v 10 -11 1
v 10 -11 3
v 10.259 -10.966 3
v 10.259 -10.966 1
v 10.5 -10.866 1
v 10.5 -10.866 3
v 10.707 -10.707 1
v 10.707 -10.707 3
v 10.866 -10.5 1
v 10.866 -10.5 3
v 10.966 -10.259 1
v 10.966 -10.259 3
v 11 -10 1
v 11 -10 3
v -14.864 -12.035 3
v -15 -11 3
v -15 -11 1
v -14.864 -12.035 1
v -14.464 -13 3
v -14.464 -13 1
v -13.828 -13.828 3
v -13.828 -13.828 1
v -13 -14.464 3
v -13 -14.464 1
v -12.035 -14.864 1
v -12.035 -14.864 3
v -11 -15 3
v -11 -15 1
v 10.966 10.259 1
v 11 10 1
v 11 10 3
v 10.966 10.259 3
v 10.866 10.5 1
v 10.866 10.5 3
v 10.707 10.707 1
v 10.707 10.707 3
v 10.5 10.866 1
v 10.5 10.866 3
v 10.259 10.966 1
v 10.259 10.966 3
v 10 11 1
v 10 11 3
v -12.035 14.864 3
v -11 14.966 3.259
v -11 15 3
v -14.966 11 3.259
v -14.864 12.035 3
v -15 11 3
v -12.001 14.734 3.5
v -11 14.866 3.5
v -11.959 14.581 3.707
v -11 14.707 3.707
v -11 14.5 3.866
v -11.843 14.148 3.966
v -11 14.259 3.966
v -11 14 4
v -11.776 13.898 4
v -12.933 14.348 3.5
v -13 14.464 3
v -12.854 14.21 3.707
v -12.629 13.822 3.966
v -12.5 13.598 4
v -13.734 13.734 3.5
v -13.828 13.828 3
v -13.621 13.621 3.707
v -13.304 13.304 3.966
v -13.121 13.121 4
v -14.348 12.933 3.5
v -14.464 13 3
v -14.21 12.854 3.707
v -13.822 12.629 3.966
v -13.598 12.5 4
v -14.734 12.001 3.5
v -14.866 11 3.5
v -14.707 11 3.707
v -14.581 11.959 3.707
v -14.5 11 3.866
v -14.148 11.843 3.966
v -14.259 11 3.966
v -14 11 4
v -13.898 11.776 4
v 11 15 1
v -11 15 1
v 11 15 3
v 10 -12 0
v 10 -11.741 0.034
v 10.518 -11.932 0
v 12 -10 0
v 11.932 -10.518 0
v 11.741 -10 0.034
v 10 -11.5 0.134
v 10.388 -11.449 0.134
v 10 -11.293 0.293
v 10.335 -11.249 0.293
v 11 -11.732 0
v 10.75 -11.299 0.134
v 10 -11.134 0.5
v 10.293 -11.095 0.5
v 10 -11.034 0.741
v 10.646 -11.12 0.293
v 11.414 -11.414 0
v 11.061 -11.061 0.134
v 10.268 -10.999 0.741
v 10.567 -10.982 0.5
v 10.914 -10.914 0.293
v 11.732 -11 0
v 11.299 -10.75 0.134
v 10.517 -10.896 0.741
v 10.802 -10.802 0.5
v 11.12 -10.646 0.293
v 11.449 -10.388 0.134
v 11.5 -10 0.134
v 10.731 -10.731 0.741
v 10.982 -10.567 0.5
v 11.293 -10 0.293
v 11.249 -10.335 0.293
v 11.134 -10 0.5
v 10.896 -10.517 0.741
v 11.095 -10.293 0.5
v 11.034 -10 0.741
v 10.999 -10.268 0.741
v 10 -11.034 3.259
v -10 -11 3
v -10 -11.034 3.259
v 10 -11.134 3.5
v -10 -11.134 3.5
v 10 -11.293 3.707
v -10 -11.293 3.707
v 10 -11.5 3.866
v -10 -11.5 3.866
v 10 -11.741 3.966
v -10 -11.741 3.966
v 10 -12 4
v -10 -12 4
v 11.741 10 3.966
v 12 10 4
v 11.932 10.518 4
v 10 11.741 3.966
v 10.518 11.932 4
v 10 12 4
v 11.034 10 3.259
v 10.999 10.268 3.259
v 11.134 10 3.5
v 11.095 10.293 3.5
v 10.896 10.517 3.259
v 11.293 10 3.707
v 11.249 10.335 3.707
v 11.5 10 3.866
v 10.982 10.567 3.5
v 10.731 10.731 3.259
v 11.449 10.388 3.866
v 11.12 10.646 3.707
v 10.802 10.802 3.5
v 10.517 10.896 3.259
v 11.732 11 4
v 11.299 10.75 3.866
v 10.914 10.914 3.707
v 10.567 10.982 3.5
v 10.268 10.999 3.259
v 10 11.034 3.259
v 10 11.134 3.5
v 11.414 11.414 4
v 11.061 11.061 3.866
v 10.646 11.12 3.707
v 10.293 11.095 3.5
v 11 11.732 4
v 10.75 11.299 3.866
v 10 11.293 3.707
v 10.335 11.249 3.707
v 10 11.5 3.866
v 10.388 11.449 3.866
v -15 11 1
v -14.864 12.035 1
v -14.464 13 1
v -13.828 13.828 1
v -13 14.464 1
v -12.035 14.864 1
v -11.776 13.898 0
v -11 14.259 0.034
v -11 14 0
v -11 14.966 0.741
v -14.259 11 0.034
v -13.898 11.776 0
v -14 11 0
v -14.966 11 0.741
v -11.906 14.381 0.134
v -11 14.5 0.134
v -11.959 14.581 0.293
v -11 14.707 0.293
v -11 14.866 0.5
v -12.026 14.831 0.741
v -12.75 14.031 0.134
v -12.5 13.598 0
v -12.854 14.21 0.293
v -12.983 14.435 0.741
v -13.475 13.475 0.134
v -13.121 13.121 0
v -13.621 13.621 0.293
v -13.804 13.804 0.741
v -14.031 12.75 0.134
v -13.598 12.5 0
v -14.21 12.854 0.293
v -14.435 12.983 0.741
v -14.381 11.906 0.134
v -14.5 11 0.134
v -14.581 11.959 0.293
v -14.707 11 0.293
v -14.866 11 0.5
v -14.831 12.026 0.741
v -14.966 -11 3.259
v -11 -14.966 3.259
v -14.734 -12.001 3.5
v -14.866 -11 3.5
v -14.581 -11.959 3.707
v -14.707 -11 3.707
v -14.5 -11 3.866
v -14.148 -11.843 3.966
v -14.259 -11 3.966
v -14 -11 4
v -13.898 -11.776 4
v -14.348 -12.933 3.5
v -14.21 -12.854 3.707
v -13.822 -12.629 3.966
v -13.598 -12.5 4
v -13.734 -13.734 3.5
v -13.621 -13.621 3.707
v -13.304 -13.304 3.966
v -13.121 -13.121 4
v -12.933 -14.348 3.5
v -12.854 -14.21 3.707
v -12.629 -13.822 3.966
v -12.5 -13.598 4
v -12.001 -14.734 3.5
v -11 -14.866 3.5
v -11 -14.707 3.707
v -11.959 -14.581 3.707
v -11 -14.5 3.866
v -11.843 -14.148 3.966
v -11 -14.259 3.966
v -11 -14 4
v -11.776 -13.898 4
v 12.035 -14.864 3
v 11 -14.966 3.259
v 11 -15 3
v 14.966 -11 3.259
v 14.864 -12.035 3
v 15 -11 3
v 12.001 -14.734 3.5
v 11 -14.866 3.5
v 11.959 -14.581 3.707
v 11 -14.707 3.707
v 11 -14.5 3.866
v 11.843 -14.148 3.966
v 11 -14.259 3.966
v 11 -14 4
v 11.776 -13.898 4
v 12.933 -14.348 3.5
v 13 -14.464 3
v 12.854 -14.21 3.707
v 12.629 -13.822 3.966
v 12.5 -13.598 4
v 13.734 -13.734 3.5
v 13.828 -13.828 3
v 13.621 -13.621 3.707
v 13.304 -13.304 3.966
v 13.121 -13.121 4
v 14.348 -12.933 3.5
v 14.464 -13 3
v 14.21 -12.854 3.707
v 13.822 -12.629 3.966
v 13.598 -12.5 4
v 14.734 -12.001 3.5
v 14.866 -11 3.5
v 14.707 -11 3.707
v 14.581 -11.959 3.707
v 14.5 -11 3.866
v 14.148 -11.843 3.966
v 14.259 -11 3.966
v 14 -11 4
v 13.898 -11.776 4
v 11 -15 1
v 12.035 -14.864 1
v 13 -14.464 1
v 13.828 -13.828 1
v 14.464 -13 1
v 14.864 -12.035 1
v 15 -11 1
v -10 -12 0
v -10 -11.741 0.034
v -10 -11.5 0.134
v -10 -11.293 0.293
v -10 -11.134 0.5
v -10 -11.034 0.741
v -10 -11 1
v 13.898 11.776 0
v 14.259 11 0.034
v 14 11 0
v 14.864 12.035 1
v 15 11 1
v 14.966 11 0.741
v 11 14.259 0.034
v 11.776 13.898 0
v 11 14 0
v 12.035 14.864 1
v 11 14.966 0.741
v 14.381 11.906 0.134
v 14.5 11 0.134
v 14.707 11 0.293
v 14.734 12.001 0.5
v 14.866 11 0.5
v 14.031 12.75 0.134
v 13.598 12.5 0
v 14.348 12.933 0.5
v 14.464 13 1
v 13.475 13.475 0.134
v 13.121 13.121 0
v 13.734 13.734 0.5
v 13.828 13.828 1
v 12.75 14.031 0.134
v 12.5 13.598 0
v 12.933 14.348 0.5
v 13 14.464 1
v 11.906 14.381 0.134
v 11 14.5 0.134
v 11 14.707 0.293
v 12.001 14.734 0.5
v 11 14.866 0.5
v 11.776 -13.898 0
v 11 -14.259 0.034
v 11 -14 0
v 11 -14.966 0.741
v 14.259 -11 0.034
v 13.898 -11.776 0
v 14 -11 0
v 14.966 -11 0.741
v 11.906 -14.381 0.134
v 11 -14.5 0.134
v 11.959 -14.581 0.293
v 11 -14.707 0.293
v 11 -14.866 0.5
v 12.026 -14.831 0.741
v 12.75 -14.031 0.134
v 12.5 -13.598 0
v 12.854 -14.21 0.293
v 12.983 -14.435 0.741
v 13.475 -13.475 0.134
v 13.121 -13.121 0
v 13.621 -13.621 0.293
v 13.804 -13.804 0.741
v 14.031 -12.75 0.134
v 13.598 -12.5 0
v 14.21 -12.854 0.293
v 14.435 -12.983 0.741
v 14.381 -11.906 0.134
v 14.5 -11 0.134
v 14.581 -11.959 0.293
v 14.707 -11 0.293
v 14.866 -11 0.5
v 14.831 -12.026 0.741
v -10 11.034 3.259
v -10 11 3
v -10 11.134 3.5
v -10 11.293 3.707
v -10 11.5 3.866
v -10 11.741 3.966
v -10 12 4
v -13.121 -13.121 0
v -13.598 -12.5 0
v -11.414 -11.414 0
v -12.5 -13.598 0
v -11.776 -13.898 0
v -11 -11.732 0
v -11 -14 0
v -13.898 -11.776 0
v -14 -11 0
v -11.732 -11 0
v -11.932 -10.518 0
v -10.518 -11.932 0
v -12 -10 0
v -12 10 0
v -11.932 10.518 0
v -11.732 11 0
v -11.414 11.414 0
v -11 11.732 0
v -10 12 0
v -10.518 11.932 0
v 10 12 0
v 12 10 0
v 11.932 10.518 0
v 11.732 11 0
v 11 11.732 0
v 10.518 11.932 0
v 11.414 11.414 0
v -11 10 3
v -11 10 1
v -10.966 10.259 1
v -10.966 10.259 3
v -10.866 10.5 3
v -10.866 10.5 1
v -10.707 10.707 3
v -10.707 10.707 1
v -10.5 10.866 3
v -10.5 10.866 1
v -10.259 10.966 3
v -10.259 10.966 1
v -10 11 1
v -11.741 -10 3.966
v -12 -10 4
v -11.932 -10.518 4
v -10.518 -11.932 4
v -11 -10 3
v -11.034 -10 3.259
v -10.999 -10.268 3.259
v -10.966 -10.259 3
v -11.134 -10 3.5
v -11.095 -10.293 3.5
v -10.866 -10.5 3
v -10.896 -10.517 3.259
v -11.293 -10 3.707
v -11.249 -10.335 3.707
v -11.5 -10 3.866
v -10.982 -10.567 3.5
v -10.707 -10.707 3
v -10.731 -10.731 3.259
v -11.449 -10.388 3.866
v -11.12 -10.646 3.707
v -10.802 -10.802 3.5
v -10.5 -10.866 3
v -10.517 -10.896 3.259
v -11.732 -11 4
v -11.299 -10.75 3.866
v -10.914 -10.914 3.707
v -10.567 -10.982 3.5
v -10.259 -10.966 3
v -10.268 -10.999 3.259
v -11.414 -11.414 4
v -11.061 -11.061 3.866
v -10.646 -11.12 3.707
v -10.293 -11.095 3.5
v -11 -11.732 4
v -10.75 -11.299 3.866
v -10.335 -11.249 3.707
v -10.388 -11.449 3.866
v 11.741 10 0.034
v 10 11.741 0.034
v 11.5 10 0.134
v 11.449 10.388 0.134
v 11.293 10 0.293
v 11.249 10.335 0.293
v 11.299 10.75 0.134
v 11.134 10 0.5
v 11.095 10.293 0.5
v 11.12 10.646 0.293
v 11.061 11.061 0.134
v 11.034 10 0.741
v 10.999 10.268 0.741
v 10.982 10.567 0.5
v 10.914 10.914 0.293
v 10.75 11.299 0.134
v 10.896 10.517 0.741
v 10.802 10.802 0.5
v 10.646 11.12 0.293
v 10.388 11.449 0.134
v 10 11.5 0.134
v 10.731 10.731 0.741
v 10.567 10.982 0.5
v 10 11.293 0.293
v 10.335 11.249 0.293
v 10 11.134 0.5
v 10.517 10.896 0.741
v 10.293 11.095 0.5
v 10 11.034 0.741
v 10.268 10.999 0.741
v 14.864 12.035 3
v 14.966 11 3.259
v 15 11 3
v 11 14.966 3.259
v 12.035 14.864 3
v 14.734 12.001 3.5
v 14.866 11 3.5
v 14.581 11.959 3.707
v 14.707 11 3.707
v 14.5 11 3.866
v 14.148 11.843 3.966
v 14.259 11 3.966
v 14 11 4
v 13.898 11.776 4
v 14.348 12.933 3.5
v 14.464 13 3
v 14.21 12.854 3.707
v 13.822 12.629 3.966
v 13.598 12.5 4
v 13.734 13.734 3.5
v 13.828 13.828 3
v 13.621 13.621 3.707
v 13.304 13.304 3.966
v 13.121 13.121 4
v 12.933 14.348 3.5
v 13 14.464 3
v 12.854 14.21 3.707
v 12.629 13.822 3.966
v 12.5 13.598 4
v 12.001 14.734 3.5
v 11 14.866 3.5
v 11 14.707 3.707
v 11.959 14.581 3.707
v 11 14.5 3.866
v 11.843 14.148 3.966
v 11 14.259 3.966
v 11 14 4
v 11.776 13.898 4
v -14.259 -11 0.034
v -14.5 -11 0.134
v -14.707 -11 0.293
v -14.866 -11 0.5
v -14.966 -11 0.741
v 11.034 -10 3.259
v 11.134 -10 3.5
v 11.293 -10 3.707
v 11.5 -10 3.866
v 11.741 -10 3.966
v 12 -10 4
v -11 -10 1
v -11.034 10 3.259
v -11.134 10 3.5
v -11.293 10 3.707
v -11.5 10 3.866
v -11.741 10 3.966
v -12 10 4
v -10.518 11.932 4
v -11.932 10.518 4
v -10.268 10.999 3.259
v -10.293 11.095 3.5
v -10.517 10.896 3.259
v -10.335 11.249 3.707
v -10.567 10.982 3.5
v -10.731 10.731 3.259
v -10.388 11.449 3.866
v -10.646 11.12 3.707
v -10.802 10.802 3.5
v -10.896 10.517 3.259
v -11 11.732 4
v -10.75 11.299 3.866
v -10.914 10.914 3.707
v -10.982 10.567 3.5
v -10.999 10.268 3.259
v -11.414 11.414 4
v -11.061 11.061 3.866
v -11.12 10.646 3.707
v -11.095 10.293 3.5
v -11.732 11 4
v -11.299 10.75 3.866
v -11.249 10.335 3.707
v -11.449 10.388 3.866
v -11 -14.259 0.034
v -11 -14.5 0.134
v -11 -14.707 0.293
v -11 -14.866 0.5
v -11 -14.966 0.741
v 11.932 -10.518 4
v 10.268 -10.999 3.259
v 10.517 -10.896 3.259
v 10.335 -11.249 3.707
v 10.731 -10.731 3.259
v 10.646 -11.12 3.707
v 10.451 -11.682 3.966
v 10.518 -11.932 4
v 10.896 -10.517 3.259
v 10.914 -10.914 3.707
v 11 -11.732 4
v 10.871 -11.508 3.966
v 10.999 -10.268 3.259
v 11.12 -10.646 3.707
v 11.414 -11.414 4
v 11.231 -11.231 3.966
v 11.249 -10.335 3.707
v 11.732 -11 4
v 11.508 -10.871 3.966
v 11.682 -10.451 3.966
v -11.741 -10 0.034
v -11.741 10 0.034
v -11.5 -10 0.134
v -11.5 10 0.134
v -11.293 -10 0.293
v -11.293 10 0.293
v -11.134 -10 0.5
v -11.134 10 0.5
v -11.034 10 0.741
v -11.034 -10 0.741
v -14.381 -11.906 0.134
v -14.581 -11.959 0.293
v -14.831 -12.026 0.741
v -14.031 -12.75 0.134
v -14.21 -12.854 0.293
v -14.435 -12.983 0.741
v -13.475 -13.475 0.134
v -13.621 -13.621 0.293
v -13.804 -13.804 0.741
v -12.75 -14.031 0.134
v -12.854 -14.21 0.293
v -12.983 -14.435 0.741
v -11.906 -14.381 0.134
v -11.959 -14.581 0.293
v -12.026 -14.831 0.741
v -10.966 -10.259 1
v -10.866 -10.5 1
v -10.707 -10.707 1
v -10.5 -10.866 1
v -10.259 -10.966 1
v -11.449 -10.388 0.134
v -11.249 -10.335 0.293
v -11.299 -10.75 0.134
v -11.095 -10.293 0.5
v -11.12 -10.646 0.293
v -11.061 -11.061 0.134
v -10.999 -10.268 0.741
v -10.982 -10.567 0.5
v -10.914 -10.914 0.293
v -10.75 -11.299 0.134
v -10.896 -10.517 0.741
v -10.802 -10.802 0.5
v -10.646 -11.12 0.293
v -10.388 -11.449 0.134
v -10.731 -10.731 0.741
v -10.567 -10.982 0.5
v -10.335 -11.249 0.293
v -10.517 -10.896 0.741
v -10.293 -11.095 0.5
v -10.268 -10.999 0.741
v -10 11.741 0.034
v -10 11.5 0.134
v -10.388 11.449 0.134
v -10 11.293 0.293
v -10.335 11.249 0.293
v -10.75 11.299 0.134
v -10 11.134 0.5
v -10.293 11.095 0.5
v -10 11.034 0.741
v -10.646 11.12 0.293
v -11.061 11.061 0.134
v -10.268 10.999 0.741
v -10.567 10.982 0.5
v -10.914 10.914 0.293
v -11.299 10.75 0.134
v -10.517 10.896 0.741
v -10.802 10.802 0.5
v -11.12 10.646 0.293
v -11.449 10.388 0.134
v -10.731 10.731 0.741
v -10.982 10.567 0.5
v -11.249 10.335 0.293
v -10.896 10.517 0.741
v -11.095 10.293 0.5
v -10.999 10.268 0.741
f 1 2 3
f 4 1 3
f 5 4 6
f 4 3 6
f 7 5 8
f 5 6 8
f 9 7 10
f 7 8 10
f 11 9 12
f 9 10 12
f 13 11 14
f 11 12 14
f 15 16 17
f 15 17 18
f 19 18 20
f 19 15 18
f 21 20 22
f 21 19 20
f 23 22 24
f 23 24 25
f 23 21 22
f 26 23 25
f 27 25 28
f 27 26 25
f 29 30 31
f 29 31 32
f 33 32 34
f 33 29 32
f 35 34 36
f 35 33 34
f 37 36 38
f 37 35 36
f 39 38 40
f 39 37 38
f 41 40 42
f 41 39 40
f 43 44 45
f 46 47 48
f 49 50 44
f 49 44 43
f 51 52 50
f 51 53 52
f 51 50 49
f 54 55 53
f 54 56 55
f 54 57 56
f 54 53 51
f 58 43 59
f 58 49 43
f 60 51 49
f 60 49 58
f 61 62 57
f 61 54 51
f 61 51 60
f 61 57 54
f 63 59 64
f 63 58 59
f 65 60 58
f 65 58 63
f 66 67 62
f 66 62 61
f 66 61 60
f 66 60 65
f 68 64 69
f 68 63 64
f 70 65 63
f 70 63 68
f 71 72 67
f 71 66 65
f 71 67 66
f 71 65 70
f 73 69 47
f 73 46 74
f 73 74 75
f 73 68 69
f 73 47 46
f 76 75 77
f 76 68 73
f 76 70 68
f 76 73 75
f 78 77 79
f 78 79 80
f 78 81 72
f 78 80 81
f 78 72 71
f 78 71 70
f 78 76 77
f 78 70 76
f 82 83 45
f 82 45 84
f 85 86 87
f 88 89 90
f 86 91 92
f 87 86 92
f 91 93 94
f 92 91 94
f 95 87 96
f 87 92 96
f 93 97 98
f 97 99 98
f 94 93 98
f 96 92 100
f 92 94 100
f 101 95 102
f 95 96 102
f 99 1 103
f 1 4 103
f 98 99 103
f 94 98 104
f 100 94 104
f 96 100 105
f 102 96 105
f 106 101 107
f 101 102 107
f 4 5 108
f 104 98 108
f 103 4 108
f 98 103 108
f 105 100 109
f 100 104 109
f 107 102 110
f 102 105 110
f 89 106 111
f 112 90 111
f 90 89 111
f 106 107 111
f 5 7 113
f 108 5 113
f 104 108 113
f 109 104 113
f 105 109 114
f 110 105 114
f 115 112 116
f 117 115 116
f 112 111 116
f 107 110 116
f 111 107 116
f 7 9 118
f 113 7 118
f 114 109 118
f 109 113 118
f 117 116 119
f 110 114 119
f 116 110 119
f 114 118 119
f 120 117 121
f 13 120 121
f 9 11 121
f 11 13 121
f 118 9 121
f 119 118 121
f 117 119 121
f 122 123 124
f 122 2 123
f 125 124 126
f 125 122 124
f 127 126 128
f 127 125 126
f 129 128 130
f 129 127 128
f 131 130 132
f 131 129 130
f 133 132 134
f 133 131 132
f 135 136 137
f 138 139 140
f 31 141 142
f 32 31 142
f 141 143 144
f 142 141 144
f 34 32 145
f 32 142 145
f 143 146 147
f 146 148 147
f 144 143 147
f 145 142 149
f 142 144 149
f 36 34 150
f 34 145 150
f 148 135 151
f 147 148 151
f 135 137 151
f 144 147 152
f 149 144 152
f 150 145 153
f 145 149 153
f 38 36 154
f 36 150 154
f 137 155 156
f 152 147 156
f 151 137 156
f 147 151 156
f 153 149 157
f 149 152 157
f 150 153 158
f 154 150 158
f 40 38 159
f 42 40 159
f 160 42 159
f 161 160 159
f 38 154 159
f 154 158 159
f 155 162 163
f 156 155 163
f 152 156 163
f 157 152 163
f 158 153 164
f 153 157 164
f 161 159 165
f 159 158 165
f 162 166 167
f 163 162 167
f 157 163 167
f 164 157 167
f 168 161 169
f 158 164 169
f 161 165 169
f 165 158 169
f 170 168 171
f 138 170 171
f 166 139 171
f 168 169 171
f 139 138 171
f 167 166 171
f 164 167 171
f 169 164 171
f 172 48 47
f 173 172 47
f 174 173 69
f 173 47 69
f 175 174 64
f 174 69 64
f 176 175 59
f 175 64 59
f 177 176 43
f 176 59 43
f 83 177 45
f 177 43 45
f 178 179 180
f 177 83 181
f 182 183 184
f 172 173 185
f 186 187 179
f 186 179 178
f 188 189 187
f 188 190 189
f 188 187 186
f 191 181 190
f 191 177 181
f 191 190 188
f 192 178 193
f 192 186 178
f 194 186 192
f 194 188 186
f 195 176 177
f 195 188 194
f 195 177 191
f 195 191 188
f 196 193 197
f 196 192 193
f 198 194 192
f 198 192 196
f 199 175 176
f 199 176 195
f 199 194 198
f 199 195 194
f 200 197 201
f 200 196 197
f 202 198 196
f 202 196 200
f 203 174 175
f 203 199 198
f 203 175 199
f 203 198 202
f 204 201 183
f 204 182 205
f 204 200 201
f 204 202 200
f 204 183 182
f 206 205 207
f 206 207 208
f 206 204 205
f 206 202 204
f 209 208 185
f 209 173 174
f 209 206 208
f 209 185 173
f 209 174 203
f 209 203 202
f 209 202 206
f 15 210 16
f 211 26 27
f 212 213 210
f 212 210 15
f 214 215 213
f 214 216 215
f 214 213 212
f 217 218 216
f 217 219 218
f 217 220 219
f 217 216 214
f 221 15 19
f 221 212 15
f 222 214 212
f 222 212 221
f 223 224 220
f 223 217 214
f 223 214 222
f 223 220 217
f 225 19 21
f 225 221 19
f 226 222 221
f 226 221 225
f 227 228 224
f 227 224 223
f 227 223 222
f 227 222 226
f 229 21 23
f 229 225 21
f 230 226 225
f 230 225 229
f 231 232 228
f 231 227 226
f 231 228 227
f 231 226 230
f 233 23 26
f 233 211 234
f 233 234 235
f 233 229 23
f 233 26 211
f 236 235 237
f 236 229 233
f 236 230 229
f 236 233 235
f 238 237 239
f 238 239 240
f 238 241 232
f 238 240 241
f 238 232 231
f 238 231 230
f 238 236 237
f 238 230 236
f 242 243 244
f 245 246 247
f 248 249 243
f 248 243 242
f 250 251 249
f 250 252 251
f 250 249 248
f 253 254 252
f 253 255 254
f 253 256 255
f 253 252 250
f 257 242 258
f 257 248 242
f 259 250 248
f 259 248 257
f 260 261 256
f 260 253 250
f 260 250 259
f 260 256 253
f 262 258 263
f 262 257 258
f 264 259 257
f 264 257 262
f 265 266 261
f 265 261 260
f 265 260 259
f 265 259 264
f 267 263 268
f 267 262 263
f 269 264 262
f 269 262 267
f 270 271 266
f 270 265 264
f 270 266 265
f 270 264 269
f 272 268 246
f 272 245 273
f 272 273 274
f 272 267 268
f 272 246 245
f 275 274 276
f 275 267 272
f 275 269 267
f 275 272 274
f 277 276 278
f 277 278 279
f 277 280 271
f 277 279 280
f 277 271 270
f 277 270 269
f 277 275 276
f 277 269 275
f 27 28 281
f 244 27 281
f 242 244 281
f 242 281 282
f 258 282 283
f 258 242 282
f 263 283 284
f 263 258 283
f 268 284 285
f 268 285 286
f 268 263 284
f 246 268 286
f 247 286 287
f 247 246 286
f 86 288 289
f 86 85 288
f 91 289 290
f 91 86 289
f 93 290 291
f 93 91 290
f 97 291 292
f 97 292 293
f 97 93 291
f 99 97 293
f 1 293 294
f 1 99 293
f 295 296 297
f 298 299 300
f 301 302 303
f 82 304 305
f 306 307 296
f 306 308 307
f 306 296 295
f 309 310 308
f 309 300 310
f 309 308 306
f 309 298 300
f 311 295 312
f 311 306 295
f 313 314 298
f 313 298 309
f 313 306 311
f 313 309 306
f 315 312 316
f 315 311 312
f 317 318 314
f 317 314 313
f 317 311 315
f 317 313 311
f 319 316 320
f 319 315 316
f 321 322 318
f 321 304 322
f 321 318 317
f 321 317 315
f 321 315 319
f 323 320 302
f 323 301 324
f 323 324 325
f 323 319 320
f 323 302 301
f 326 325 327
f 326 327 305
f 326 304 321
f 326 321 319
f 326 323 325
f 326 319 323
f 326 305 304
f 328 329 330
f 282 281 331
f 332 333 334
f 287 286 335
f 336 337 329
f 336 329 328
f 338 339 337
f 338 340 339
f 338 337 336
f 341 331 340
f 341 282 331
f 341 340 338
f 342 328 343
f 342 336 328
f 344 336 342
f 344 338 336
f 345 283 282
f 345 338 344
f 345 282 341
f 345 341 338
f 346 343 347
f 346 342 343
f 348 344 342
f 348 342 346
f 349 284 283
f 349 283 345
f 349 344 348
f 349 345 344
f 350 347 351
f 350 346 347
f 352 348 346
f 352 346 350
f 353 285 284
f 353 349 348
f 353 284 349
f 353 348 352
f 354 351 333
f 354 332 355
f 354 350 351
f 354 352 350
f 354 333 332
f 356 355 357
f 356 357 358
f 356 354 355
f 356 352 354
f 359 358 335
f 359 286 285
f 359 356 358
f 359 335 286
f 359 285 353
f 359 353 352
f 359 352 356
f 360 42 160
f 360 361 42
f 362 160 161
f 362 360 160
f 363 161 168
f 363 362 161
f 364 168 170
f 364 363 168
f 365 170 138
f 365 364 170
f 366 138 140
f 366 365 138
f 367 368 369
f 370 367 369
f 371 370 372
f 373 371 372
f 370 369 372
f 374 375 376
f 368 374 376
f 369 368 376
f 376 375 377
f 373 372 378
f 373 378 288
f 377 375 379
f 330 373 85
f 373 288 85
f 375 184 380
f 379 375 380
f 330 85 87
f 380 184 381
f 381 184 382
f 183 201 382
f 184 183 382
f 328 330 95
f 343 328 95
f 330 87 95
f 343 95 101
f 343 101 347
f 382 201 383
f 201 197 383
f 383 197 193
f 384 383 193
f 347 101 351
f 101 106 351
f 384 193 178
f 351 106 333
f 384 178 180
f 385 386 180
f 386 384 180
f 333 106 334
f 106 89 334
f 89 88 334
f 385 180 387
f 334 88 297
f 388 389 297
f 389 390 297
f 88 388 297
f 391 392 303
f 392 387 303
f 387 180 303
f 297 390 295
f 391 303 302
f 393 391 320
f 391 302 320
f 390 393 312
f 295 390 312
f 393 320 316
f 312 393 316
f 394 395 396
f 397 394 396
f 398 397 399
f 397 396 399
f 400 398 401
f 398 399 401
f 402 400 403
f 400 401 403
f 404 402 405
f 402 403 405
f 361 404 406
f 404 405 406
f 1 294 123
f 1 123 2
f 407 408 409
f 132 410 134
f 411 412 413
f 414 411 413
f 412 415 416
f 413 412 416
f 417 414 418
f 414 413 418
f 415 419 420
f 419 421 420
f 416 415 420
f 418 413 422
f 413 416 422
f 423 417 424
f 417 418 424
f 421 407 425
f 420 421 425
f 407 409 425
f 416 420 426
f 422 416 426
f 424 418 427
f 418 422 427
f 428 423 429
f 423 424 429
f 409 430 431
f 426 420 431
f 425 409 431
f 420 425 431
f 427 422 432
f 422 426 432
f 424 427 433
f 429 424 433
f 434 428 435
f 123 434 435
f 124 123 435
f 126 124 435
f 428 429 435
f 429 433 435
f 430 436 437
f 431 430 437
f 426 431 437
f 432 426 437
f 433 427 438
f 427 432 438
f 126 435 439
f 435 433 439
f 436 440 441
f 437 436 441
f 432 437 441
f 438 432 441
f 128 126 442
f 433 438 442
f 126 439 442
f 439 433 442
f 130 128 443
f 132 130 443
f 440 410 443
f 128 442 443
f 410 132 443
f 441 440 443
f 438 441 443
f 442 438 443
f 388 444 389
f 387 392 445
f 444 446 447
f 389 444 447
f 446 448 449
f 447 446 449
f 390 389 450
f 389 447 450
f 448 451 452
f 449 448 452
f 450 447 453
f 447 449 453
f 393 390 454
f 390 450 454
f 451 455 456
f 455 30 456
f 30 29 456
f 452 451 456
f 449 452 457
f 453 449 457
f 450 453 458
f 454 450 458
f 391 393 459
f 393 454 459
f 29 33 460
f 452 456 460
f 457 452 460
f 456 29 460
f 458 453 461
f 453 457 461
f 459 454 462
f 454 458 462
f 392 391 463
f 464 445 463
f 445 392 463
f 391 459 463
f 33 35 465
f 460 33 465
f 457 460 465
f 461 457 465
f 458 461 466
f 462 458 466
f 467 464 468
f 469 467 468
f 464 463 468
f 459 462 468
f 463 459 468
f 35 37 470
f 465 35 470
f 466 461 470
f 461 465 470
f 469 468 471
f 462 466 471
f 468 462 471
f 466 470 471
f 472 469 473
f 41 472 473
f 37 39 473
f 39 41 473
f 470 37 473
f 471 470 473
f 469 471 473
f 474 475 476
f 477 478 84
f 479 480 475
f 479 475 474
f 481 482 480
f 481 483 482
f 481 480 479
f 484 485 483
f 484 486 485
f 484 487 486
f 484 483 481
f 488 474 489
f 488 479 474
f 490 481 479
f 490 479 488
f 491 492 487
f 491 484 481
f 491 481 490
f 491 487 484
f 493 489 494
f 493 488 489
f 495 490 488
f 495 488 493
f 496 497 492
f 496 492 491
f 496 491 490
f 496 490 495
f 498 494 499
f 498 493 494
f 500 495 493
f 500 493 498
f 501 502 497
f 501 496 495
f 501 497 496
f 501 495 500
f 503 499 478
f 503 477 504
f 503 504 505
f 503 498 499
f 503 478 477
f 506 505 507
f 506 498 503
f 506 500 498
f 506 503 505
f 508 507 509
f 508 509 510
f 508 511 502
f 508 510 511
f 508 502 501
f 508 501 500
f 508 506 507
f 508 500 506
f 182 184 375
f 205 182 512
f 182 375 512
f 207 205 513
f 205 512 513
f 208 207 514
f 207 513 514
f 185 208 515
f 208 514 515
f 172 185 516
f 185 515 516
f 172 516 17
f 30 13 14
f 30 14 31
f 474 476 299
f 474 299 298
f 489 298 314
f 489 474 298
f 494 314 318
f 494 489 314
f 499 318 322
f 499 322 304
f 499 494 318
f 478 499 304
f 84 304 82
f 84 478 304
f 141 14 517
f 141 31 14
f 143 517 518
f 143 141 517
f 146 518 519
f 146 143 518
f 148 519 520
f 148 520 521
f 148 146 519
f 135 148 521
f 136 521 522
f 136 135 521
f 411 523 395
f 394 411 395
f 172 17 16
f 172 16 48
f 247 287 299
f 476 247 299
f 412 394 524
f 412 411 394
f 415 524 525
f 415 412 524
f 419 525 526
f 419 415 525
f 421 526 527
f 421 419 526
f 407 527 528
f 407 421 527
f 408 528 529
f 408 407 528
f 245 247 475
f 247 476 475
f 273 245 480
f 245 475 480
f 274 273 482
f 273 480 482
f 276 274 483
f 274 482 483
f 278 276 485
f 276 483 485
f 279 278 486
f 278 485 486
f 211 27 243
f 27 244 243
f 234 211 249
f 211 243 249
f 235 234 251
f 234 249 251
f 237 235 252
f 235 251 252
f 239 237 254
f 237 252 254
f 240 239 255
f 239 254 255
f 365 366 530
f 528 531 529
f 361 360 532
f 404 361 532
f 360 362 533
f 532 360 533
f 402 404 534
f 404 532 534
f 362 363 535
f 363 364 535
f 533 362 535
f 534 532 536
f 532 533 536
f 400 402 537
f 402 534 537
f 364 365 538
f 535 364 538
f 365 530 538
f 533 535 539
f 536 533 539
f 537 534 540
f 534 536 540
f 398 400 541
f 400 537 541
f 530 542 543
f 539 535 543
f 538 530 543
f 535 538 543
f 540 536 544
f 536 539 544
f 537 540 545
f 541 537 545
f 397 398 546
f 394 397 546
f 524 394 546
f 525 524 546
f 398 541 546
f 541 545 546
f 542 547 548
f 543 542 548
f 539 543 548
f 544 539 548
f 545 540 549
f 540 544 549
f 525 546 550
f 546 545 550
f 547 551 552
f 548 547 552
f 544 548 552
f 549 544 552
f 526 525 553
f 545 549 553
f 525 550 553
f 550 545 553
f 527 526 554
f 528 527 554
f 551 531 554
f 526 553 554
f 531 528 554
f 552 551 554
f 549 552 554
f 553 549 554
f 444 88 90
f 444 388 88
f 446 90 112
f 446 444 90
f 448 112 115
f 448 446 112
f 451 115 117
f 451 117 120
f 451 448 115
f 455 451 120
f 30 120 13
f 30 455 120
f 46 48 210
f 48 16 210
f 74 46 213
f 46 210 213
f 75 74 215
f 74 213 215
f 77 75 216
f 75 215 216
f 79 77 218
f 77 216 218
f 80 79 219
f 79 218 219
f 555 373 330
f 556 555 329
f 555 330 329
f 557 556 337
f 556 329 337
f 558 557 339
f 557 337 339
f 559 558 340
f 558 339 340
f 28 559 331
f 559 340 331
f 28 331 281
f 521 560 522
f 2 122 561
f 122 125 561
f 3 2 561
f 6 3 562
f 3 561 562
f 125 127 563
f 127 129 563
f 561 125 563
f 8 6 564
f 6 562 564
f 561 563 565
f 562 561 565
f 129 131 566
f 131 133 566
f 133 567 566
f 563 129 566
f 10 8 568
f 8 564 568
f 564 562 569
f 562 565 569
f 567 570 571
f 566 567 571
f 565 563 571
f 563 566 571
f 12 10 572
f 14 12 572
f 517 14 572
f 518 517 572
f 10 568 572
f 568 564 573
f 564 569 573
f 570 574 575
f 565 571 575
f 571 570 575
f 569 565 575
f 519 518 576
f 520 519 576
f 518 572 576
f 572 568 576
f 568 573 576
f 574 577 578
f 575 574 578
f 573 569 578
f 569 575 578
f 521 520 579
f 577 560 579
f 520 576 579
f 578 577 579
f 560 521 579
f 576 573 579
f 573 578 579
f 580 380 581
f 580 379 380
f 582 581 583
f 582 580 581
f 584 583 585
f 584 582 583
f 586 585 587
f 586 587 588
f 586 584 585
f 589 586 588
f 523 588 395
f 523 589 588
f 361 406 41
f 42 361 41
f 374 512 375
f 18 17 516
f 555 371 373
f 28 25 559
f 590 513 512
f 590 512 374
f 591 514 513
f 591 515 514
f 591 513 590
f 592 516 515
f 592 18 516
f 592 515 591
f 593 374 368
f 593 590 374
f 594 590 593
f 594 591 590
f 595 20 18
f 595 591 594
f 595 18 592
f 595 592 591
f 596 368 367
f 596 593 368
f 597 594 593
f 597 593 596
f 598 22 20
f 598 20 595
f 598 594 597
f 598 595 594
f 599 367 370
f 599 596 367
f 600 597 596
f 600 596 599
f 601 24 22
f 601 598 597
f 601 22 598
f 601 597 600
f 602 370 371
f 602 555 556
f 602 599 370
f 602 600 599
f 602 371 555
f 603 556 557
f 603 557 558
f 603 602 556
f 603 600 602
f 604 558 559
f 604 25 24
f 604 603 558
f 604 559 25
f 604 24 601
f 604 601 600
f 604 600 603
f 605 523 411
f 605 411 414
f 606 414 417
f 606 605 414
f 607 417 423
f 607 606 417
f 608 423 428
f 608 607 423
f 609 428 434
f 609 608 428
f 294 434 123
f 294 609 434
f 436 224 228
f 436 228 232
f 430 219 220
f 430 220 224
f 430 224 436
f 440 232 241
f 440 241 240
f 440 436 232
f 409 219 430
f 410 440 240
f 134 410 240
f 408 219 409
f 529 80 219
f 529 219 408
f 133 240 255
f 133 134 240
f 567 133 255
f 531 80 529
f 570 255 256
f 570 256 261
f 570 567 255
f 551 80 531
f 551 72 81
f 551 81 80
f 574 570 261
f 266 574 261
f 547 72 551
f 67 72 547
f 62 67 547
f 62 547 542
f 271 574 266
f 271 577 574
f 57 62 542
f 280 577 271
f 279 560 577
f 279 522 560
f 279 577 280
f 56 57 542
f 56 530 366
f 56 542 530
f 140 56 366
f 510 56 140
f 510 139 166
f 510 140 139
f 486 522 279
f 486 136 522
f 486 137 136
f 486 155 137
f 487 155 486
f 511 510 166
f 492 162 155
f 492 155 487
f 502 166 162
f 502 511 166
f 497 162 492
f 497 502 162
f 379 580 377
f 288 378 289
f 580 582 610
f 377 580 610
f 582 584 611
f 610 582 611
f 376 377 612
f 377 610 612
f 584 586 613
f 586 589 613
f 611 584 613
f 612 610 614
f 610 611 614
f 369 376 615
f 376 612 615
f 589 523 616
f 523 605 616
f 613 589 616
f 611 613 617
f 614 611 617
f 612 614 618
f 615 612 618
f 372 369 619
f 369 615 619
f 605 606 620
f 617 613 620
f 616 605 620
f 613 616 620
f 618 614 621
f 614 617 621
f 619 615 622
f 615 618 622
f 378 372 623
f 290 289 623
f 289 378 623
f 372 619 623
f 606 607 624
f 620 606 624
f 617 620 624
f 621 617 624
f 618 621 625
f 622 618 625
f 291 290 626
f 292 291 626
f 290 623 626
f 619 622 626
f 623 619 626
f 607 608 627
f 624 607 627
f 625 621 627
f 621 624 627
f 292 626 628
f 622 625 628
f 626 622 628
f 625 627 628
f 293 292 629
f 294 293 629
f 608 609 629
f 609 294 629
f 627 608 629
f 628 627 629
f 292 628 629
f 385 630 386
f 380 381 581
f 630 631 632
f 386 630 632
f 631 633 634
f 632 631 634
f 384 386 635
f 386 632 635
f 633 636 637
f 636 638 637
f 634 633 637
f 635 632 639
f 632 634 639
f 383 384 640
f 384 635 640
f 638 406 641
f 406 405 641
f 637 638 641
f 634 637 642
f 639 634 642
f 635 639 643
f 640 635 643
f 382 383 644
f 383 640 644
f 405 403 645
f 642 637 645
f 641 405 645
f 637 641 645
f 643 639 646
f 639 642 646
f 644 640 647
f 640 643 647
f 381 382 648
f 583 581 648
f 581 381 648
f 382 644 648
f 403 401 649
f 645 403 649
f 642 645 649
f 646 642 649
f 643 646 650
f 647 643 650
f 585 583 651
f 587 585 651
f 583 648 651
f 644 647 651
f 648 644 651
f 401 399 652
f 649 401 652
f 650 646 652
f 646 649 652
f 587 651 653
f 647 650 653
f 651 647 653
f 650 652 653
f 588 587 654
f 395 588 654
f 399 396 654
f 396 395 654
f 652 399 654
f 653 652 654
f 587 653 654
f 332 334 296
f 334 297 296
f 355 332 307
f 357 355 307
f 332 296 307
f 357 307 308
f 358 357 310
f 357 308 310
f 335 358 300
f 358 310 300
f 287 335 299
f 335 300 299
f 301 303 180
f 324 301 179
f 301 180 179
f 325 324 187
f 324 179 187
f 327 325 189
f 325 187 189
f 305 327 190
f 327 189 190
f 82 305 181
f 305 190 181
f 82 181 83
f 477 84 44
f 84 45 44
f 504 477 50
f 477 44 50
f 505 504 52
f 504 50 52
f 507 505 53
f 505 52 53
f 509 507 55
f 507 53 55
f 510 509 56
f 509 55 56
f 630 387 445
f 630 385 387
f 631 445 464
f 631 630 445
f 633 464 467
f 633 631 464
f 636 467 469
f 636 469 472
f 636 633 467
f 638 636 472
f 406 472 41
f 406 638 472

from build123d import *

# Parameters (mm, degrees)
F0_W     = 30
F0_H     = 30
F1_DEPTH = 4
F2_T     = -4
F3_R     = 1
F4_R     = 4
F5_R     = 1


with BuildPart() as f1:
    # F0 (on Top) → F1 (new body)
    with BuildSketch(Plane.XY):
        Rectangle(F0_W, F0_H)
    extrude(amount=F1_DEPTH)

    # F2
    f2_openings = [f1.faces().sort_by_distance(p)[0] for p in [
        (0, 0, 4),
        (0, 0, 0),
    ]]
    offset(amount=F2_T, openings=f2_openings)

    # F3
    f3_edges = [f1.edges().sort_by_distance(p)[0] for p in [
        (-11, 11, 2),
        (11, 11, 2),
        (-11, -11, 2),
        (11, -11, 2),
    ]]
    fillet(f3_edges, radius=F3_R)

    # F4
    f4_edges = [f1.edges().sort_by_distance(p)[0] for p in [
        (-15, 15, 2),
        (15, 15, 2),
        (-15, -15, 2),
        (15, -15, 2),
    ]]
    fillet(f4_edges, radius=F4_R)

    # F5
    f5_edges = [f1.edges().sort_by_distance(p)[0] for p in [
        (11, 0, 4),
        (15, 0, 4),
        (13.828427, 13.828427, 0),
        (10.707107, 10.707107, 0),
    ]]
    fillet(f5_edges, radius=F5_R)


solid = f1.part
